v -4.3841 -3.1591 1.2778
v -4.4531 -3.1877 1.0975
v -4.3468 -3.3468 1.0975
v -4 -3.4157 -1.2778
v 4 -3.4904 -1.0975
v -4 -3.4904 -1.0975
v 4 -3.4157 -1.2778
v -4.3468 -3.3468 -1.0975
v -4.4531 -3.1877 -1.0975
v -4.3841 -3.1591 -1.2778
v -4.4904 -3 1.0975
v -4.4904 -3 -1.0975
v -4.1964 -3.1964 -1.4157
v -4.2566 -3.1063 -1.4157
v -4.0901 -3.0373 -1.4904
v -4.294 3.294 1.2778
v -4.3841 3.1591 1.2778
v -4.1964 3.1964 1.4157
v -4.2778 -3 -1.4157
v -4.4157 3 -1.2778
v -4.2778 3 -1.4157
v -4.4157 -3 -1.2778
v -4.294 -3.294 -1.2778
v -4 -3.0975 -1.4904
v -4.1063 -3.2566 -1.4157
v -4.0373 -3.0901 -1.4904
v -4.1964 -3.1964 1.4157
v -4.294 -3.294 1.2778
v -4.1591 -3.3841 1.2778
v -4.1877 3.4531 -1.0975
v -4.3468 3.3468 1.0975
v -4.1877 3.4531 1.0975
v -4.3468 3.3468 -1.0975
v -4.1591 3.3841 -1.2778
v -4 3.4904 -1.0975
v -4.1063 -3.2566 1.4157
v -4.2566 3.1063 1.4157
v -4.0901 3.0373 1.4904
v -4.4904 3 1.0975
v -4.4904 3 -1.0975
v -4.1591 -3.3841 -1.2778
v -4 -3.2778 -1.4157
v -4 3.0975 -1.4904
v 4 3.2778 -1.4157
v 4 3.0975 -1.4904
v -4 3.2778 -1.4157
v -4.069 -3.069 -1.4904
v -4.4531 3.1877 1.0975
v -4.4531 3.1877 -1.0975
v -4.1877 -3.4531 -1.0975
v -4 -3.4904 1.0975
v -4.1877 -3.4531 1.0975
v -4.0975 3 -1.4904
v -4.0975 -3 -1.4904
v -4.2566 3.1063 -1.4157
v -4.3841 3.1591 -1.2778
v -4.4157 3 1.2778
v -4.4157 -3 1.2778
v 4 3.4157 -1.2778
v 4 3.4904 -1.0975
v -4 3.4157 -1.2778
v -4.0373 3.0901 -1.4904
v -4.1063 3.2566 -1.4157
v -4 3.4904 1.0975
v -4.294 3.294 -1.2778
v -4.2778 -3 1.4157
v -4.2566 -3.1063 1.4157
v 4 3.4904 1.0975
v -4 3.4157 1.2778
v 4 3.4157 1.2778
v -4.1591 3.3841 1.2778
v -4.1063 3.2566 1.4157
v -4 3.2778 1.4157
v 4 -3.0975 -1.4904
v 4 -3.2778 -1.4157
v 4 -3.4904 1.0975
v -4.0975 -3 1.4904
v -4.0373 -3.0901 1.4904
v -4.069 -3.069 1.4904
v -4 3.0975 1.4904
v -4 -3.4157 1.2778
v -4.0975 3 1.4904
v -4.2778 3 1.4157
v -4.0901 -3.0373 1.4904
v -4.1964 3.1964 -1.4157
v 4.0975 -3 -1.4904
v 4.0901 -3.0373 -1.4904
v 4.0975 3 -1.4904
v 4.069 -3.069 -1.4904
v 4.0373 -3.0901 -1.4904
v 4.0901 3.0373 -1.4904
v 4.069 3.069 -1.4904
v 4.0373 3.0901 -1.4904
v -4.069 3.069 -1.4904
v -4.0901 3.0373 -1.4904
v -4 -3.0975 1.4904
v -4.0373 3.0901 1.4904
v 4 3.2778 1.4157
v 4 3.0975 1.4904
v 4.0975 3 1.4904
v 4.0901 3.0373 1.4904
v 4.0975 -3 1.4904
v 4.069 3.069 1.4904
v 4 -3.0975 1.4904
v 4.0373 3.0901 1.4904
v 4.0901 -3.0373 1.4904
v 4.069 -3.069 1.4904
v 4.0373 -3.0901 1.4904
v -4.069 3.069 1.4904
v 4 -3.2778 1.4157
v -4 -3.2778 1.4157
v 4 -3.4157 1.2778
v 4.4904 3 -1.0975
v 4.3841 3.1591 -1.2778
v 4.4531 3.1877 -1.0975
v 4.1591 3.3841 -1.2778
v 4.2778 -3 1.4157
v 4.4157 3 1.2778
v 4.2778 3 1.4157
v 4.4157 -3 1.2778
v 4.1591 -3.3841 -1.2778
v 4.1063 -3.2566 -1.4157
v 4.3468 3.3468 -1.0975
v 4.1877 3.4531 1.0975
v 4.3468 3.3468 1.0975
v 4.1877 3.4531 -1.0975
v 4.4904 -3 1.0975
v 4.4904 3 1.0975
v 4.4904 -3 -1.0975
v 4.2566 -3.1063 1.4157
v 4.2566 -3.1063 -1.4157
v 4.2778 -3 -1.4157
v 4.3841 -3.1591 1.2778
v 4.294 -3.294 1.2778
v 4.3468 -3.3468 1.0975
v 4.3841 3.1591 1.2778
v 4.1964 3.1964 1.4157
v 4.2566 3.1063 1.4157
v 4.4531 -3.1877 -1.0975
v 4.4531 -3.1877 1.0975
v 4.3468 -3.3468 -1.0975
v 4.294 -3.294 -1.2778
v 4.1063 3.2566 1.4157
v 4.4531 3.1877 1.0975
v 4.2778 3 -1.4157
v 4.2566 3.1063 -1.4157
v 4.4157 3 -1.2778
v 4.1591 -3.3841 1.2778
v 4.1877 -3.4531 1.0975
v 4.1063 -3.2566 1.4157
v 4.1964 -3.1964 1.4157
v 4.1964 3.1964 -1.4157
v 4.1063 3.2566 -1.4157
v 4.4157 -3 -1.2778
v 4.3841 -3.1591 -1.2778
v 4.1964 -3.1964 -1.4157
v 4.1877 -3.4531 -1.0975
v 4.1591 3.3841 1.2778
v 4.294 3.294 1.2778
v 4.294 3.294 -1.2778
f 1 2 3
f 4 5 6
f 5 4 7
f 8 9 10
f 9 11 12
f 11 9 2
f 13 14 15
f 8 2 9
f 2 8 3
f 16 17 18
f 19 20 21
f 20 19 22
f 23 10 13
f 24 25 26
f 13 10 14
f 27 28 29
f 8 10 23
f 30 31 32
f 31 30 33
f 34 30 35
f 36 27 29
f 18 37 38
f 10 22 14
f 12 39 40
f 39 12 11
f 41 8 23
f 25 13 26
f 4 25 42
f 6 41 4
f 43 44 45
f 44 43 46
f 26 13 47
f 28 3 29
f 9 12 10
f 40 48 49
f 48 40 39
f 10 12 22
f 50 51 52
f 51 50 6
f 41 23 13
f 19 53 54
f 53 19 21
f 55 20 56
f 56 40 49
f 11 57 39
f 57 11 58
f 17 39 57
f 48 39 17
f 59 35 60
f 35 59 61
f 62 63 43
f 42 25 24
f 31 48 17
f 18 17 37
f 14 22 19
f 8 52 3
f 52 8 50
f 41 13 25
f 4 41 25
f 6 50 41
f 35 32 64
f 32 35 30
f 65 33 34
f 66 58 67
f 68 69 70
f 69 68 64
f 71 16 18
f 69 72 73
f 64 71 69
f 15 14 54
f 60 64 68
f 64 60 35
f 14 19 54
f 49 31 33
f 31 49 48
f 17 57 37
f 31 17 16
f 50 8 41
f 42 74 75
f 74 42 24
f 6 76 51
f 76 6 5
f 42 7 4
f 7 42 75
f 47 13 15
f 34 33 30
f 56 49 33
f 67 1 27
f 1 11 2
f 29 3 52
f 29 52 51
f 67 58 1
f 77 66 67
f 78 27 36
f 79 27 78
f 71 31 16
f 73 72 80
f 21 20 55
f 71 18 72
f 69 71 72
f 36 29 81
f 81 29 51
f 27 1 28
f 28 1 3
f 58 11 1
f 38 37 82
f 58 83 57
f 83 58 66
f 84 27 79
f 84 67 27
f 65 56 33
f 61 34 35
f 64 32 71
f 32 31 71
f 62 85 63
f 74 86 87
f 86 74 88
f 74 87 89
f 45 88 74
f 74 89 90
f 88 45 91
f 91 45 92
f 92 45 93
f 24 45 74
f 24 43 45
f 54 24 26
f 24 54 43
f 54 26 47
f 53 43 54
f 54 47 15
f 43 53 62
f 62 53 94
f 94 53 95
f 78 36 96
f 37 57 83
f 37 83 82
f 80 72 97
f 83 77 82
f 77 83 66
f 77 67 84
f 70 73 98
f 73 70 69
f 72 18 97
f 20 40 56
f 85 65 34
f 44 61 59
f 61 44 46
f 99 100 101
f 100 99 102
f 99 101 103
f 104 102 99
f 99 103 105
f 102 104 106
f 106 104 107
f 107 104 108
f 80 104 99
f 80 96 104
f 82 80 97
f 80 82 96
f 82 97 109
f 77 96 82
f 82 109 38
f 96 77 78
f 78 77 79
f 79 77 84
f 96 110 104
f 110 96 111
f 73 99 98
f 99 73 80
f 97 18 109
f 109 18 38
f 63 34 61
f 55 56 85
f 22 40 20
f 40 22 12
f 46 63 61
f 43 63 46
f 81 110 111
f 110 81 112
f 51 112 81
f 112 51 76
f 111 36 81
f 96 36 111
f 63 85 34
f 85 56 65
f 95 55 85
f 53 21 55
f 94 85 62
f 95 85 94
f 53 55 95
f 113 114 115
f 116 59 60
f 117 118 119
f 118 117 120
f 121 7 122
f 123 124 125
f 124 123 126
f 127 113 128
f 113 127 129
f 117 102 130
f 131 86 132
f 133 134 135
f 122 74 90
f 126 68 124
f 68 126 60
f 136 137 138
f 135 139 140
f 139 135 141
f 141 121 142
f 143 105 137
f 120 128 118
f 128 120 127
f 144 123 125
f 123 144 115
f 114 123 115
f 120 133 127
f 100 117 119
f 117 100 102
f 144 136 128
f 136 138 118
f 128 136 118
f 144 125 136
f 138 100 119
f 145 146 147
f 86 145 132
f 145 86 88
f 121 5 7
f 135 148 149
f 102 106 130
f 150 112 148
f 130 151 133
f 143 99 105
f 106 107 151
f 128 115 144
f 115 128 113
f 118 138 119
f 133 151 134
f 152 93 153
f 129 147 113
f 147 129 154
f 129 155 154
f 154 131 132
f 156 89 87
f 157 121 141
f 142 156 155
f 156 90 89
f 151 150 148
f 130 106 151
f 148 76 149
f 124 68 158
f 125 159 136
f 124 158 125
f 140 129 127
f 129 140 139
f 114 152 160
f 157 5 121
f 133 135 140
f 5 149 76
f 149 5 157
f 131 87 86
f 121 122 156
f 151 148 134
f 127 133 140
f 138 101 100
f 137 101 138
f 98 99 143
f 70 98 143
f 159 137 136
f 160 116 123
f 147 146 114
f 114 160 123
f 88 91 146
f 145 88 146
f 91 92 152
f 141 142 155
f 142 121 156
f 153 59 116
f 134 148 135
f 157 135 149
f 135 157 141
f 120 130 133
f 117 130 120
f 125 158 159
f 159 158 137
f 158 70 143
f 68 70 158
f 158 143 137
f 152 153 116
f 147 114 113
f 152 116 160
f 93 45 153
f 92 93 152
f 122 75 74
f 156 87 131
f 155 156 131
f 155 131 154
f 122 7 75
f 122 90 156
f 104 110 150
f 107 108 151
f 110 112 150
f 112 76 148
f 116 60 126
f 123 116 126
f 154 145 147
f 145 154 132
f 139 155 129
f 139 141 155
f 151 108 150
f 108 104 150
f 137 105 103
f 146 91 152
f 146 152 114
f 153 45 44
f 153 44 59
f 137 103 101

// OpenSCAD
// Falls back to the sampled hull: the operand is a union of three balls, not
// one ball, which is the shape BOSL2's `cuboid(rounding=)` sums. Faceted by the
// operand's own `$fn`, and taken through tessellation rather than the offset.
minkowski() {
  cube([6, 6, 2], center = true);
  union() {
    sphere(0.5, $fn = 16);
    translate([1, 0, 0]) sphere(0.5, $fn = 16);
    translate([-1, 0, 0]) sphere(0.5, $fn = 16);
  }
}
